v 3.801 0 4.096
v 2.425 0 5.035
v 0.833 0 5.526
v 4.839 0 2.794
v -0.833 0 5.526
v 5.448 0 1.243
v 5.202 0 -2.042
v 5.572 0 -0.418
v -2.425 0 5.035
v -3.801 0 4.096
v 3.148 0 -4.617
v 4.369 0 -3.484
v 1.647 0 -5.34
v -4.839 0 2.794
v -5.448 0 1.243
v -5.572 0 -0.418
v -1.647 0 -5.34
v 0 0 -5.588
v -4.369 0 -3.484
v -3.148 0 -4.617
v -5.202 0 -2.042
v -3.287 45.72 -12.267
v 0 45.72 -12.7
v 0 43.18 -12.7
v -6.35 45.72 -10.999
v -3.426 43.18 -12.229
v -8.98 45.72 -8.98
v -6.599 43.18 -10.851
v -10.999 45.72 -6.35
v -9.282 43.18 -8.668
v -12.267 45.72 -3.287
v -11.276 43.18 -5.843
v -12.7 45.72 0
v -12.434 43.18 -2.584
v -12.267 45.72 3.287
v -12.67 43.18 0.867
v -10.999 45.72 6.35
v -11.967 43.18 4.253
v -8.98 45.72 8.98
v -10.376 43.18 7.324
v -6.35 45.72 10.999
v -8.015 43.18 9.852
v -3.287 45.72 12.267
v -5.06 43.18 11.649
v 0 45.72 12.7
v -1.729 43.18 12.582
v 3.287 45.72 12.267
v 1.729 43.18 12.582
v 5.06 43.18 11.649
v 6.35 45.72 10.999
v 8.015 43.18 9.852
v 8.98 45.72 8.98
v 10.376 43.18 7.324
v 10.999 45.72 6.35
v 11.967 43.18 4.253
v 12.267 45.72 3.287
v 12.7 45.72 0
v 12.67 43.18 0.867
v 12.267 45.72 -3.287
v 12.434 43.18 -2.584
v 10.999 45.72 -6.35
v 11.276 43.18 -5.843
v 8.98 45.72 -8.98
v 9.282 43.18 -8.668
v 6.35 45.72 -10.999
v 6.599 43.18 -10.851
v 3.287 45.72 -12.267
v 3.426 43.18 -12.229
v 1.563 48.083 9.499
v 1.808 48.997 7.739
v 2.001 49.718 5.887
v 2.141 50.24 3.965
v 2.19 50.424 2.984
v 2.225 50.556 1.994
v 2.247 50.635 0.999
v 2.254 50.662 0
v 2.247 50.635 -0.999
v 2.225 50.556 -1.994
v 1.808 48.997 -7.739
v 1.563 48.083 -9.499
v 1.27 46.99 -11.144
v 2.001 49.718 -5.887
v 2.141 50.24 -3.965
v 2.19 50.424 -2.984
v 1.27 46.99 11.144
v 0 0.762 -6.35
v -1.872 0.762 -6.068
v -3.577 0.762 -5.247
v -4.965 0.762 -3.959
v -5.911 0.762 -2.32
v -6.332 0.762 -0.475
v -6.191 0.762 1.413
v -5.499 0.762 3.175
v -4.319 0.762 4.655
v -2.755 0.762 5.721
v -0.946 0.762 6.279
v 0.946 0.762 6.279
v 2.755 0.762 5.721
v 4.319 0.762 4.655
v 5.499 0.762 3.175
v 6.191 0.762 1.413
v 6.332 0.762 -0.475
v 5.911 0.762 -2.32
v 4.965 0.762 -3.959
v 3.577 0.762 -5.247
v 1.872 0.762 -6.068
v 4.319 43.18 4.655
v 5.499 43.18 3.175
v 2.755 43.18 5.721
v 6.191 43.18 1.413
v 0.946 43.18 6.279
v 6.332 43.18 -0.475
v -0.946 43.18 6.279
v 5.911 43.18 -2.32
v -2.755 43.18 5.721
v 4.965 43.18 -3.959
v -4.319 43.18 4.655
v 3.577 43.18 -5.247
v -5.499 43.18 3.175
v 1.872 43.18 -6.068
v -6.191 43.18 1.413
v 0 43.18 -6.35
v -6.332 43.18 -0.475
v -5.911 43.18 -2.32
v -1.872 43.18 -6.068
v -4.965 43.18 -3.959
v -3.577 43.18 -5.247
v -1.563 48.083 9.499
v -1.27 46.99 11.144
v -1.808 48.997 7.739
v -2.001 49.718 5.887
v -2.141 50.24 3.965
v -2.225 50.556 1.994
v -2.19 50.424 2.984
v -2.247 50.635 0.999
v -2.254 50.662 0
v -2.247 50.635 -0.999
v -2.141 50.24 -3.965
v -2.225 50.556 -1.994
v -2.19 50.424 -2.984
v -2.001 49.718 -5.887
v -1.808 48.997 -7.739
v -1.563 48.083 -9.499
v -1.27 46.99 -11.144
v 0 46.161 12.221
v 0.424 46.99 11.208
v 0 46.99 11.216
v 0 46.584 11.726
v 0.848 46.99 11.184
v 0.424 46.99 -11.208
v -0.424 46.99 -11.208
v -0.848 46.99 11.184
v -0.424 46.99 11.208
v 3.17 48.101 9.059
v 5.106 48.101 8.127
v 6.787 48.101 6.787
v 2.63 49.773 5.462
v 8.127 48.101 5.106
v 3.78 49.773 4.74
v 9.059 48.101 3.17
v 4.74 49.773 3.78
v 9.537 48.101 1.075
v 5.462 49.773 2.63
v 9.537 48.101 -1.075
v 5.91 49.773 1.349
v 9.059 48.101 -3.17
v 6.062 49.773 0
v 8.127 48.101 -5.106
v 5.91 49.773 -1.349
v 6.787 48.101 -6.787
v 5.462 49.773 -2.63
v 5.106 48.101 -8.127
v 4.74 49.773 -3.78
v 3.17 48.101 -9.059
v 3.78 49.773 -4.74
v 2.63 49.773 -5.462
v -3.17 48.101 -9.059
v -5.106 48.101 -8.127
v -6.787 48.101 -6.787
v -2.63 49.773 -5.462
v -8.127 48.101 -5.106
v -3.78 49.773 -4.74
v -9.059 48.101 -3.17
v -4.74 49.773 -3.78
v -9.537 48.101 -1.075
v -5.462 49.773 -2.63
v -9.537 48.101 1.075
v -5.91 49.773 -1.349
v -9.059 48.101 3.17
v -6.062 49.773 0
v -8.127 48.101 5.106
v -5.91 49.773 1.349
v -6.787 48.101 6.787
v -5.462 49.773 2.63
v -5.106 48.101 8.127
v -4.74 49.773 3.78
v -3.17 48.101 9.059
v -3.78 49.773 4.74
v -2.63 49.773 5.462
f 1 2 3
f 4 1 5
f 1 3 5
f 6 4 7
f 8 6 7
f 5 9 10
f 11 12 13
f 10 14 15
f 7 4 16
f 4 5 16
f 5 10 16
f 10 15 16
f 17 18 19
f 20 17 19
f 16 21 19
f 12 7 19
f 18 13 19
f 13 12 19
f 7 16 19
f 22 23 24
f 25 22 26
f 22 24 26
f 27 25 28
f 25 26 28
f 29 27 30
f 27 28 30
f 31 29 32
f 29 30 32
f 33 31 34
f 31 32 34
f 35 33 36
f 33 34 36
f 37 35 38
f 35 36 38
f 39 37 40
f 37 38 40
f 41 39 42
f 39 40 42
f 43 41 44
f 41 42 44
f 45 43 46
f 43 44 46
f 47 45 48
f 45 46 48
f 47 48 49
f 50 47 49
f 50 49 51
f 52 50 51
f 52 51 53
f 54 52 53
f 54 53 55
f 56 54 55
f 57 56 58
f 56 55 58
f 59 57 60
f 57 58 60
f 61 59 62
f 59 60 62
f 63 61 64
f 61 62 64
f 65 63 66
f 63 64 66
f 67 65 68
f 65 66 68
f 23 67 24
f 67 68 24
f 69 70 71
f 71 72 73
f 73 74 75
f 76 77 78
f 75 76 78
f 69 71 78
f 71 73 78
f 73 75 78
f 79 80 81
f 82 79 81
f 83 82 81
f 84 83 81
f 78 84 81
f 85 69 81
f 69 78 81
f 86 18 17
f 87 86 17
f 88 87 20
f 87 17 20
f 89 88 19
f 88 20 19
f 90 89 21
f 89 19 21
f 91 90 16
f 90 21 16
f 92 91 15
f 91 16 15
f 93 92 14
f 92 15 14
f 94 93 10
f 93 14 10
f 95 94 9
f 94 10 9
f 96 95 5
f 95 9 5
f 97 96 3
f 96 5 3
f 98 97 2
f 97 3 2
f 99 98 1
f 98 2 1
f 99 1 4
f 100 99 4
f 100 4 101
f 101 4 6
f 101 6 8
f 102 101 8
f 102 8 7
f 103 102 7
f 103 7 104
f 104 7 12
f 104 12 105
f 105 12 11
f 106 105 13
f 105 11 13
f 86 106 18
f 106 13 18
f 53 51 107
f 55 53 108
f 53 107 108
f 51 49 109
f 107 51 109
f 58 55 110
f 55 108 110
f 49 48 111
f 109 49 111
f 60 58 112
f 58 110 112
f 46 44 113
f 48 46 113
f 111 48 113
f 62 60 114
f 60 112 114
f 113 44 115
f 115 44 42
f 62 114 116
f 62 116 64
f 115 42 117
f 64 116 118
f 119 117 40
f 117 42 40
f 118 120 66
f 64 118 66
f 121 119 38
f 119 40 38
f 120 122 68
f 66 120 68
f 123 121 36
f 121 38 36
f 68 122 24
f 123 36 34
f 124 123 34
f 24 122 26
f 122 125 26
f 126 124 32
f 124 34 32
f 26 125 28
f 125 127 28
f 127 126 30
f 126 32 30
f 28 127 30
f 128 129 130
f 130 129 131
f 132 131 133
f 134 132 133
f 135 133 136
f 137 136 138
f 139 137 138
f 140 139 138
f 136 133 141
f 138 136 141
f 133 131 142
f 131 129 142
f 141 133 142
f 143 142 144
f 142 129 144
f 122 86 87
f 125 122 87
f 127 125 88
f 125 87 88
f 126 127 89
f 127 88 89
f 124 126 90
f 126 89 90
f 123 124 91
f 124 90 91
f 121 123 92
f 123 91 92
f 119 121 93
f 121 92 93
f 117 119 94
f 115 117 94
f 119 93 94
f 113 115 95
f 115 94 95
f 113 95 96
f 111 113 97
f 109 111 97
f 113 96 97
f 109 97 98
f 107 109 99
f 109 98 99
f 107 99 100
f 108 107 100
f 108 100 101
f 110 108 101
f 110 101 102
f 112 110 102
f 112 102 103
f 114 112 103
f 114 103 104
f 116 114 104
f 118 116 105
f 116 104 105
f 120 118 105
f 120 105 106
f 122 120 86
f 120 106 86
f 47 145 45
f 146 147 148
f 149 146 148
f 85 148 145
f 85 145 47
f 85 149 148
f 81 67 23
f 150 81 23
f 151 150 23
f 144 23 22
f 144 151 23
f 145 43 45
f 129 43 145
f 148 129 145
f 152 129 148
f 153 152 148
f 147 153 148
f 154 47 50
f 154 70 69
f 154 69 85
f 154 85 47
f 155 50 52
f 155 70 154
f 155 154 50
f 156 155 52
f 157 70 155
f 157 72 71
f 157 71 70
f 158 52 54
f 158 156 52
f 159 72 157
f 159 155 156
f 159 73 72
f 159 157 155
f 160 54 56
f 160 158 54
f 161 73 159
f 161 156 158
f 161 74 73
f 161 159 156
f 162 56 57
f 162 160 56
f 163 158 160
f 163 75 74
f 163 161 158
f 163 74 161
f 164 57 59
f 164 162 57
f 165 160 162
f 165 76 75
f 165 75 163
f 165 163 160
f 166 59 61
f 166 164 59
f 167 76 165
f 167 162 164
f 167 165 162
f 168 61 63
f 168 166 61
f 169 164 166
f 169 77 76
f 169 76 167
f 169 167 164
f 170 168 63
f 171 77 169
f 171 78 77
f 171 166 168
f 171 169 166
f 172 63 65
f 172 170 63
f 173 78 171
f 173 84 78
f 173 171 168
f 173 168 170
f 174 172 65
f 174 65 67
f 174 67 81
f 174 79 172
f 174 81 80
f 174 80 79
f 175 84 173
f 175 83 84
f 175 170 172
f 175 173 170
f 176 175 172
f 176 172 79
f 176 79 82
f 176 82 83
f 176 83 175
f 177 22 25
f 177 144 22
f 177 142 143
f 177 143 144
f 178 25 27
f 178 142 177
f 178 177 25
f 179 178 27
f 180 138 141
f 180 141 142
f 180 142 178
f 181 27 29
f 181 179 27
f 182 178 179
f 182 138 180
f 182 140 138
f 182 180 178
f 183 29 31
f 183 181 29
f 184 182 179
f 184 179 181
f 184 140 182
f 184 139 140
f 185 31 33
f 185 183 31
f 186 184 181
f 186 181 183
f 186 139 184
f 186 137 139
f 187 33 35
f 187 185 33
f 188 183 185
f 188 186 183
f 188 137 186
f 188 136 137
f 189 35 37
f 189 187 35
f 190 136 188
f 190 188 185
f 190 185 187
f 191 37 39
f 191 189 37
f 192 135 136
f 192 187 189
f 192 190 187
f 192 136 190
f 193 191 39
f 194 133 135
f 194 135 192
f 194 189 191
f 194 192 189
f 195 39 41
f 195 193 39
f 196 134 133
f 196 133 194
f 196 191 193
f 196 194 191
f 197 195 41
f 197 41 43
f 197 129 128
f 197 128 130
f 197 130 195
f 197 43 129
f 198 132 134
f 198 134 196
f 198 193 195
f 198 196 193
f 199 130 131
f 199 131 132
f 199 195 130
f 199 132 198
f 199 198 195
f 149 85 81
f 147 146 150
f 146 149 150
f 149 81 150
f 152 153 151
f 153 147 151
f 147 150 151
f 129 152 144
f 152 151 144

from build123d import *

# Parameters (mm, degrees)
DOME2_FACE_RADIUS       = 12.7
DOME2_HEIGHT            = 5.08
CUT_EXTRUDE2_DEPTH      = 54.881536726
CUT_EXTRUDE2_DEPTH_BACK = 54.881536726
CHAMFER1_SIZE           = 0.762


with BuildPart() as part:
    # Sketch1 → Revolve1 (revolve)
    with BuildSketch(Plane.XY, mode=Mode.PRIVATE) as revolve1_sk:
        Polygon((0, 0), (0, 45.72), (-12.7, 45.72), (-12.7, 43.18), (-6.35, 43.18), (-6.35, 0), align=None)
    revolve(revolve1_sk.sketch.rotate(Axis((0, 0, 0), (0, 1, 0)), 270), axis=Axis((0, 0, 0), (0, 1, 0)))

    # Dome2: a dome of height H over a round flat face of radius A is a cap of a sphere of radius (A * A + H * H) / (2 * H)
    dome2_r = (DOME2_FACE_RADIUS * DOME2_FACE_RADIUS + DOME2_HEIGHT * DOME2_HEIGHT) / (2 * DOME2_HEIGHT)
    dome2_base = Plane((0, 45.72, 0), z_dir=(0, 1, 0))
    with Locations(dome2_base.offset(DOME2_HEIGHT - dome2_r)):
        dome2_ball = Sphere(dome2_r, mode=Mode.PRIVATE)
    add(split(dome2_ball, bisect_by=dome2_base, keep=Keep.TOP, mode=Mode.PRIVATE))

    # Sketch2 → Cut-Extrude2 (cut, two sides: drawn at the far end of the back side and taken through both)
    with BuildSketch(Plane.XY.offset(-CUT_EXTRUDE2_DEPTH_BACK)):
        Polygon((1.27, 46.99), (-1.27, 46.99), (-3.262213041, 54.425040289), (3.262213041, 54.425040289), align=None)
    extrude(amount=CUT_EXTRUDE2_DEPTH + CUT_EXTRUDE2_DEPTH_BACK, mode=Mode.SUBTRACT)

    # Chamfer1
    chamfer1_edges = [part.edges().sort_by_distance(p)[0] for p in [
        (0, 0, 6.35),
    ]]
    chamfer(chamfer1_edges, length=CHAMFER1_SIZE)


solid = part.part
